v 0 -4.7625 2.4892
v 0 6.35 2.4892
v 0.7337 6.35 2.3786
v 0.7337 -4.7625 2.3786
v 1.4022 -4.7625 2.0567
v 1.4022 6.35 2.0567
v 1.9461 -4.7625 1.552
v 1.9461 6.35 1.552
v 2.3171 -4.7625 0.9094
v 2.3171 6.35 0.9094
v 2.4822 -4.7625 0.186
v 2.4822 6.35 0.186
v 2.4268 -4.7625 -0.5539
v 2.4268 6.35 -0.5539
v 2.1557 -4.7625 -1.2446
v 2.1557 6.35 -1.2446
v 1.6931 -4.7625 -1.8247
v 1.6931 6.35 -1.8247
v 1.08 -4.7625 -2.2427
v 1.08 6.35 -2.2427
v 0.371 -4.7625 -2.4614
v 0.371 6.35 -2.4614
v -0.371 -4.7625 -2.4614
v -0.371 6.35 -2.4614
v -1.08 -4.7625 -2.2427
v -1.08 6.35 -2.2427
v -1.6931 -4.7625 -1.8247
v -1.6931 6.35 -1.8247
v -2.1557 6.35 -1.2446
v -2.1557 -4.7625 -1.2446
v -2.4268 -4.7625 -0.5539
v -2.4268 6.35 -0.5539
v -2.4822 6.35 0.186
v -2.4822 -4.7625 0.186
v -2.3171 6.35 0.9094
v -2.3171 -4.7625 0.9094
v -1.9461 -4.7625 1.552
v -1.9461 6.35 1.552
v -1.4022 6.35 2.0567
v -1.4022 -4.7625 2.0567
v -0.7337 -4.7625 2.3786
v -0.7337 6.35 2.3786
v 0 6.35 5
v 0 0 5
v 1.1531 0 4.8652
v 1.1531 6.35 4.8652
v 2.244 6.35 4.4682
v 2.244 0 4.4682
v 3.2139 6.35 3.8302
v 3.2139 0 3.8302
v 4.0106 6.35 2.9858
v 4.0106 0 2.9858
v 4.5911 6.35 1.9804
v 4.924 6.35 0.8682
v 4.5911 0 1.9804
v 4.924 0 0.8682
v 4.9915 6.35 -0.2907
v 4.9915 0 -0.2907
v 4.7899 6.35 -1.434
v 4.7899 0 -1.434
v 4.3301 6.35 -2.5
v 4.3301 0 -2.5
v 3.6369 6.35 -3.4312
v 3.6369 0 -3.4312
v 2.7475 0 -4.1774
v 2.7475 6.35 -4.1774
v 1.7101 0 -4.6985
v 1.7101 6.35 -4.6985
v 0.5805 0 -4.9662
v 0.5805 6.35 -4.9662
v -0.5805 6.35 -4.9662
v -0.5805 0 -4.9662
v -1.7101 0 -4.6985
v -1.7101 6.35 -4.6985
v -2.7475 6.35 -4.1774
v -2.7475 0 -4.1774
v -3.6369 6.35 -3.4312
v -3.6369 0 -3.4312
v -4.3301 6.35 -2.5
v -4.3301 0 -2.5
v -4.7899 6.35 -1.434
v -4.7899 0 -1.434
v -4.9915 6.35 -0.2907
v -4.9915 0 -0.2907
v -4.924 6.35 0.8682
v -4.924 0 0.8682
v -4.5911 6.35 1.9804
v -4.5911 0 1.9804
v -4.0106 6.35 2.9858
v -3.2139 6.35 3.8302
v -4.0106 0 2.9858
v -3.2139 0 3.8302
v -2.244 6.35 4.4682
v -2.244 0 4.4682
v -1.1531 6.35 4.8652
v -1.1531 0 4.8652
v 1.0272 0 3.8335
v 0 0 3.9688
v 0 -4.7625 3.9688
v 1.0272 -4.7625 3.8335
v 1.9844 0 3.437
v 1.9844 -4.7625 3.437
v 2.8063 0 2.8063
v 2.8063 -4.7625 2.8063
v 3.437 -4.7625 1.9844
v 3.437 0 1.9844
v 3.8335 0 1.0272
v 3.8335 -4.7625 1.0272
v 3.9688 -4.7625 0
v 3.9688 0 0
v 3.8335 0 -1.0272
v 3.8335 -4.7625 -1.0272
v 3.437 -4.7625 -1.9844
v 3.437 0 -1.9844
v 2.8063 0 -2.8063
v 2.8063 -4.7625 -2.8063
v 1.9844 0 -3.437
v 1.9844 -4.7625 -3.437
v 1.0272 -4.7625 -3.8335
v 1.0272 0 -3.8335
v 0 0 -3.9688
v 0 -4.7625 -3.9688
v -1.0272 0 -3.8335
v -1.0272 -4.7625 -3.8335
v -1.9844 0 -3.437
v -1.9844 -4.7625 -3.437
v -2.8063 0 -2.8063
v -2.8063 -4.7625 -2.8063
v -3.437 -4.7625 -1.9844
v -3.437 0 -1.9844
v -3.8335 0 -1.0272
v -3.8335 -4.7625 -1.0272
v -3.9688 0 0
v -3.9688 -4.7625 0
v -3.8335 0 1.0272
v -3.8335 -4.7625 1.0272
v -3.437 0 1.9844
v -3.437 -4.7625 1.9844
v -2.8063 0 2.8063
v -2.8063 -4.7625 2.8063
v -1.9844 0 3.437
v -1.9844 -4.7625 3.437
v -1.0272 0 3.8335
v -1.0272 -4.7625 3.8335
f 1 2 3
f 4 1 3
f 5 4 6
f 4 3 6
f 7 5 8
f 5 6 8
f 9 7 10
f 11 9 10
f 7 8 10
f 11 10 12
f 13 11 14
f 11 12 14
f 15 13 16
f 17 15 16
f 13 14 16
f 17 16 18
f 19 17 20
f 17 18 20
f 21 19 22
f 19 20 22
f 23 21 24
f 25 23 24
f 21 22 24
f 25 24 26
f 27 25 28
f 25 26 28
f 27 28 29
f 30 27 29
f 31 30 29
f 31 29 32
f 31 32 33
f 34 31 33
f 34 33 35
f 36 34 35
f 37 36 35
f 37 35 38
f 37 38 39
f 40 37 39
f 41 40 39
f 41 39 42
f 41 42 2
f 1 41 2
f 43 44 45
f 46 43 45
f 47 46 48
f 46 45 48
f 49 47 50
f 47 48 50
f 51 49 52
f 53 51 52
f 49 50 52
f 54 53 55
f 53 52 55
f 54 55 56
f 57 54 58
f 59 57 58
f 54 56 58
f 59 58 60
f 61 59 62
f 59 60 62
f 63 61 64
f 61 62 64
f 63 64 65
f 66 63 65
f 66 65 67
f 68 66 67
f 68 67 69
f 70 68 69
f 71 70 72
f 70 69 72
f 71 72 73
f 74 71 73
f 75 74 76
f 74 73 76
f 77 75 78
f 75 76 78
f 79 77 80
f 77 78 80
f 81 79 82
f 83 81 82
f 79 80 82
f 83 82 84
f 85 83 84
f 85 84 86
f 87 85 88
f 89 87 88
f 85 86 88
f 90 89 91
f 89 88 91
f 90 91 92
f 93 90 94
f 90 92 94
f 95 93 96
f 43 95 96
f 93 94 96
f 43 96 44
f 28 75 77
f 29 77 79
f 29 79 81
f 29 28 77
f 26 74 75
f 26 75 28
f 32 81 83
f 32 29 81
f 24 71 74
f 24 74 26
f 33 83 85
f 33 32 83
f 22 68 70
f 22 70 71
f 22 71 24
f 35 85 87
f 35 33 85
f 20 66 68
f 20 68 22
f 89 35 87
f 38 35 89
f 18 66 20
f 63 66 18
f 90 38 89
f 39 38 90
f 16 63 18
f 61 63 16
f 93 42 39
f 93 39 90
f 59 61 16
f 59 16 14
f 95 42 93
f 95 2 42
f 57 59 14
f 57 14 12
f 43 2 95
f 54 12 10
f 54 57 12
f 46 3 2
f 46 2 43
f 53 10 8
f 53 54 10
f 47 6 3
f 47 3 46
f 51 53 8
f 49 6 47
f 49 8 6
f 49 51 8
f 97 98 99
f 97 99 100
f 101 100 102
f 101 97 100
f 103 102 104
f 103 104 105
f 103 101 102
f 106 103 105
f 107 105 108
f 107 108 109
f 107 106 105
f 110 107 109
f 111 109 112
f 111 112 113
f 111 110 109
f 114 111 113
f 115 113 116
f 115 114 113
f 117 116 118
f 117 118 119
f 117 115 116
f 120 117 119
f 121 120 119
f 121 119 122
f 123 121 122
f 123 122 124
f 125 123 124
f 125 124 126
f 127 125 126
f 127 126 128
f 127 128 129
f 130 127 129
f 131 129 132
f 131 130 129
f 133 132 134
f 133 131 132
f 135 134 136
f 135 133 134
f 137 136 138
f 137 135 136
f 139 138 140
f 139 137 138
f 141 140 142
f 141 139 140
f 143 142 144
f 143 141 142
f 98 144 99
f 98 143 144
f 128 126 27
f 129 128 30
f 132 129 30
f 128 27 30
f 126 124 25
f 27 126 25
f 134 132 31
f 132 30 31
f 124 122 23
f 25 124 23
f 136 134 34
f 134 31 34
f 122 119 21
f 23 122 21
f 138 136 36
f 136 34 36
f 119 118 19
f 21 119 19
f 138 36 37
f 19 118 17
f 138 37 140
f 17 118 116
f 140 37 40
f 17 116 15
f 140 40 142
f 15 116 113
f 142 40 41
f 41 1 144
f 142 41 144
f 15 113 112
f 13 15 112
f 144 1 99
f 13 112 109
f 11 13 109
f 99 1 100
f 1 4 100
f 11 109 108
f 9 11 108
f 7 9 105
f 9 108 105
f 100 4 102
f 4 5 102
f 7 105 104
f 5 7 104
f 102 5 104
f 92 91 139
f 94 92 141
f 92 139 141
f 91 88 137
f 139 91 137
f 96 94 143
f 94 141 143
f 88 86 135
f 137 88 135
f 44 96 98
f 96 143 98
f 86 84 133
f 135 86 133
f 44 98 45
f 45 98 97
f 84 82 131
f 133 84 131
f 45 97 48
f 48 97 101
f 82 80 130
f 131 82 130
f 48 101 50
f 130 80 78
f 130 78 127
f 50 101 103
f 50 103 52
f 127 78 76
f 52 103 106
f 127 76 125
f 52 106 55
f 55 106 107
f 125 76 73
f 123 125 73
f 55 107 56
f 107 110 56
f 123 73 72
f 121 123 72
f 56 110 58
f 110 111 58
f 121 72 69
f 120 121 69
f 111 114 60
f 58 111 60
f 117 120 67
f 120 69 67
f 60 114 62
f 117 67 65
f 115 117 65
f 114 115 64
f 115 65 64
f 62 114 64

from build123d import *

# Parameters (mm, degrees)
SKETCH1_R              = 5
BEARING_COLLAR_DEPTH   = 6.35
SKETCH1_3_R            = 3.96875
CENTER_SPINDLE_DEPTH   = 4.7625
F_10_CLEARANCE_HOLE1_D = 4.9784


with BuildPart() as part:
    # Sketch1 → Bearing Collar (new body)
    with BuildSketch(Plane(origin=(0, 0, 0), x_dir=(1, 0, 0), z_dir=(0, 1, 0))):
        Circle(SKETCH1_R)
    extrude(amount=BEARING_COLLAR_DEPTH)

    # Sketch1<3> → Center Spindle (add)
    with BuildSketch(Plane(origin=(0, 0, 0), x_dir=(1, 0, 0), z_dir=(0, 1, 0))):
        Circle(SKETCH1_3_R)
    extrude(amount=-CENTER_SPINDLE_DEPTH)

    # #10 Clearance Hole1 (through all)
    with Locations(Plane(origin=(0, -4.7625, 0), x_dir=(0, 0, -1), z_dir=(0, -1, 0))):
        with Locations((0, 0)):
            Hole(F_10_CLEARANCE_HOLE1_D / 2)


solid = part.part
